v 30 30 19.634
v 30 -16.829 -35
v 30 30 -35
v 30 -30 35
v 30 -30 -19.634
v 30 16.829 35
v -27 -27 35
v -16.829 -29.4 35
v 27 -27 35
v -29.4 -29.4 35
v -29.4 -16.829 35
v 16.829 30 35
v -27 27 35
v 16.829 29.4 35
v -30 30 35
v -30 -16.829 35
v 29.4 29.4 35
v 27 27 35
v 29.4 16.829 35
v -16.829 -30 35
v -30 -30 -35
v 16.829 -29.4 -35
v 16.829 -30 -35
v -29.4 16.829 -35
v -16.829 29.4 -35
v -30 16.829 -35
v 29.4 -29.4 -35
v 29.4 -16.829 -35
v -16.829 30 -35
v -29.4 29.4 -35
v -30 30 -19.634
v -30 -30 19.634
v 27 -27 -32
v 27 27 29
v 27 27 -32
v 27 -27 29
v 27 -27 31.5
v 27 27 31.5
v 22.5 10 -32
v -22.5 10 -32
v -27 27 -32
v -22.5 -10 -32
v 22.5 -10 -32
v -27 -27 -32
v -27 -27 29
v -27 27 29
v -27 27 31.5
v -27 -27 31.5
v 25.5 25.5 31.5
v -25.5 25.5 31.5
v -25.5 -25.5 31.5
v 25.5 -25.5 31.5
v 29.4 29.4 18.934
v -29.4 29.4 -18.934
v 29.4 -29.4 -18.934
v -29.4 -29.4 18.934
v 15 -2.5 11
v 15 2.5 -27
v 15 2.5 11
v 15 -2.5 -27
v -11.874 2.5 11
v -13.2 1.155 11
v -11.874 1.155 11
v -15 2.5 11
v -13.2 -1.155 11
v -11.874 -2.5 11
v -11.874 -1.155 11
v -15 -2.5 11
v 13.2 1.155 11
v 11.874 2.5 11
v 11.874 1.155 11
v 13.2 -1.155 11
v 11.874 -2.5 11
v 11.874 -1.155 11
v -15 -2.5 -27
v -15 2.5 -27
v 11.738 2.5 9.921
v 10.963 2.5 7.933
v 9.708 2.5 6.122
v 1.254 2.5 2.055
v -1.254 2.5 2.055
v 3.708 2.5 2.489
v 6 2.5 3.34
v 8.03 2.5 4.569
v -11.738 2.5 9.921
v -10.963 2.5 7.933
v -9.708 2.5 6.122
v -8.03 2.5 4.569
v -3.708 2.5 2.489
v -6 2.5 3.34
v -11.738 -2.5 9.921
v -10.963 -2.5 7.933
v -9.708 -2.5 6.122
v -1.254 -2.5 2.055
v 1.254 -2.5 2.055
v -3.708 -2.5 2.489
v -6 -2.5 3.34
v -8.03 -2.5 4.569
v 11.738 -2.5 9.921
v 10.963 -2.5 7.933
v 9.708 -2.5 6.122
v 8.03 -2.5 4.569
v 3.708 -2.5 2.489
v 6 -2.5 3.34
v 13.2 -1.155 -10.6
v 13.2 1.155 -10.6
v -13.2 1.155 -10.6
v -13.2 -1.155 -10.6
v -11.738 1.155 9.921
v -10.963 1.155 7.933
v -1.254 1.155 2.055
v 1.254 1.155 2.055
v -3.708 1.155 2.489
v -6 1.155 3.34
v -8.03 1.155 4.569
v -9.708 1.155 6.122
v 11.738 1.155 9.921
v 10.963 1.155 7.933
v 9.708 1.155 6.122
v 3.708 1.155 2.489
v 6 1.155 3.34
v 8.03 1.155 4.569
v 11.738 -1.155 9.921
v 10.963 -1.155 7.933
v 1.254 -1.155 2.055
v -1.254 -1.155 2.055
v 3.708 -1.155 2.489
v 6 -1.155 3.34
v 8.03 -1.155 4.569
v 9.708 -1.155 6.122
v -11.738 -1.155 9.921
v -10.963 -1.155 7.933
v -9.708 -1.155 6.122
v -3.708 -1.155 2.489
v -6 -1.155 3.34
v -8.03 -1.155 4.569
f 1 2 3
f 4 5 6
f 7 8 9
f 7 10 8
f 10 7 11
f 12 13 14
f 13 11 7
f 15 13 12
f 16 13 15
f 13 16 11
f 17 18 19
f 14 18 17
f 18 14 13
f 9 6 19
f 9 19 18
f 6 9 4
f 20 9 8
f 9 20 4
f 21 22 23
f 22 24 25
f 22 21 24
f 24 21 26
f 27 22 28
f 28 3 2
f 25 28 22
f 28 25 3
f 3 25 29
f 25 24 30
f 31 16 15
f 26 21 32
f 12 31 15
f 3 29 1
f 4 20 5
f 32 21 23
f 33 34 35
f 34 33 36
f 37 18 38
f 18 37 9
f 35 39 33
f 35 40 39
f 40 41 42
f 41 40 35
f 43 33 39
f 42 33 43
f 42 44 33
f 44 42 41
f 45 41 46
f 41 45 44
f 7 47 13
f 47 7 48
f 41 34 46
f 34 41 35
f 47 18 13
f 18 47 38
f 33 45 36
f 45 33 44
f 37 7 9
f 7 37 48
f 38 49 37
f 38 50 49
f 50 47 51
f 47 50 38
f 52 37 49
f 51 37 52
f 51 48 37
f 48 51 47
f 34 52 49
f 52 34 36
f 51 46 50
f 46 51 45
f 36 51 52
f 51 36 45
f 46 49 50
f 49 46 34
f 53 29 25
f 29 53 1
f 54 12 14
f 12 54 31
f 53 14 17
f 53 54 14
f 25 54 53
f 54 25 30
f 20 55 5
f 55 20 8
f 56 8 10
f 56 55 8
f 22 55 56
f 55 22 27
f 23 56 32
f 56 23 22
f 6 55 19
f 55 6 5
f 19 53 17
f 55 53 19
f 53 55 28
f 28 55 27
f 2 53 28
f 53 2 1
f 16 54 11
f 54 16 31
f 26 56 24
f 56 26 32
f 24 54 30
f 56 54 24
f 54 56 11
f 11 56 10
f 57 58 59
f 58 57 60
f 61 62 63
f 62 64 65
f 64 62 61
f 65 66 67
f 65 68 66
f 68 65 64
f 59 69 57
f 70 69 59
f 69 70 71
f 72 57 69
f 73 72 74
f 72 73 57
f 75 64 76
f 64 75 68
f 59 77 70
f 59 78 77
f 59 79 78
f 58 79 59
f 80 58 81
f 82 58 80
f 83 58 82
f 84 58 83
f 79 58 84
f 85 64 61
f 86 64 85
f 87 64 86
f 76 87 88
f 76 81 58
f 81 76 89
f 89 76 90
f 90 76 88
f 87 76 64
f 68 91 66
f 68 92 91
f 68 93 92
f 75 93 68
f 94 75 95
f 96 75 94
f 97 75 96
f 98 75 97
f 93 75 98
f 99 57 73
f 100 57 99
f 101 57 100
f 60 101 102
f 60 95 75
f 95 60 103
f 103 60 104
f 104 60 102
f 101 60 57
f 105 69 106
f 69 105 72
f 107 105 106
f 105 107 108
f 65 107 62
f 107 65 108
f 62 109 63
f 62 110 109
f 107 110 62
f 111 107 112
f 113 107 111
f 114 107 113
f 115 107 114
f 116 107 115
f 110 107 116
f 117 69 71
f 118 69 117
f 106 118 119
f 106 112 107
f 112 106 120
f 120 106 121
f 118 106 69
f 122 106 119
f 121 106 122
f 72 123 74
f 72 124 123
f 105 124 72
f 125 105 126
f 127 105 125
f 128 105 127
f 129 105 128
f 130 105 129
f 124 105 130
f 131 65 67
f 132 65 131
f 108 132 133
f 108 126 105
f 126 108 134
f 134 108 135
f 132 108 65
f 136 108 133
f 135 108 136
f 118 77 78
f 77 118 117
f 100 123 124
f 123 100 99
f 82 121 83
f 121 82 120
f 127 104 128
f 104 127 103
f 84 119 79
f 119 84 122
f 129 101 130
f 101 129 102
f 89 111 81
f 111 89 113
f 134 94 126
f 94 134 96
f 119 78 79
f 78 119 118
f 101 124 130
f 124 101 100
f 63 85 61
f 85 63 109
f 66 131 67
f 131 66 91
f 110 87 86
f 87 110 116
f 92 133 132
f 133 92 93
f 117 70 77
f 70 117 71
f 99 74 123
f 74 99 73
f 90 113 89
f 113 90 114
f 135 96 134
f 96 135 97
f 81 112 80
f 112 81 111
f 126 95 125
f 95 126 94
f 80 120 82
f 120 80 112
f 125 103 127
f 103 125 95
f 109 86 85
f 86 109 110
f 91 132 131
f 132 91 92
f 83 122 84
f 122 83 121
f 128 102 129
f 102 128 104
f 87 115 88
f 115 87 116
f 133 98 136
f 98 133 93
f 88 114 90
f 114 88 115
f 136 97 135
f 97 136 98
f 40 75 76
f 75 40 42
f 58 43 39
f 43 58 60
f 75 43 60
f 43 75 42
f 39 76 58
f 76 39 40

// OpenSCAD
pared = 3;
alto_caja = 70;
ancho_caja = 60;

alto_base_sd = 8;
alto_soporte_sd = 38; 

espesor_v = 1.2;
ancho_v = 20;

alto_tapa = 5;



module caja (){    
    difference(){cube([ancho_caja,ancho_caja,alto_caja], center=true);
    translate([0,0,pared])cube([ancho_caja-(pared*2),ancho_caja-(pared*2),alto_caja], center=true);}
}

module lineaV (){
    rotate([0,atan(ancho_caja/alto_caja),0])cube([ancho_v,espesor_v,alto_caja*ancho_caja], center=true);
}

module lineasv(){
    translate([0,(ancho_caja/2),0]) lineaV();
    translate([0,-(ancho_caja/2),0]) rotate([0,0,180])  lineaV();
    translate([(ancho_caja/2),00,0]) rotate([00,0,90])  lineaV();
    translate([-(ancho_caja/2),0,0]) rotate([0,0,270])  lineaV();
}

module sd(){
    translate([0,0,(alto_caja/2-alto_base_sd)*-1+alto_soporte_sd/2])
    difference(){
    //	SD Standard: 32.0×24.0×2.1 mm 
    cube([30,5,alto_soporte_sd], center =true);
    translate([0,0,15]) scale(1.1) cube([24,2.1,32], center =true);
    translate([0,0,20])
    rotate([90,0,0])scale([1.2,1,1])cylinder(h=10, r1=10, r2=10, center=true);
}}

module pisosd(){    
    translate([0,0,((alto_caja/2)-(pared/2))*-1])
hull(){
    translate([0,0,  alto_base_sd-pared])
        cube([30,5,pared], center = true);    
    cube([45,20,pared], center = true);    
//    scale([2,1,1])cylinder(h=3, r1=12, r2=12);
    }
}

module borde_tapa(){
translate([0,0,(alto_caja/2)-alto_tapa])
difference(){
cube([ancho_caja, ancho_caja, pared], center=true);

hull(){    
translate([0,0,pared/2 -1]) 
    cube([ancho_caja-pared *3, ancho_caja-(pared*3), 2], center=true);
translate([0,0, -pared/2]) 
    cube([ancho_caja-(pared*2), ancho_caja-(pared*2), 1], center=true);
};
}}



module caja_completa(){   
difference(){
union(){
    caja();
    borde_tapa();        
    }

lineasv();}

sd();
pisosd();
}


caja_completa();

